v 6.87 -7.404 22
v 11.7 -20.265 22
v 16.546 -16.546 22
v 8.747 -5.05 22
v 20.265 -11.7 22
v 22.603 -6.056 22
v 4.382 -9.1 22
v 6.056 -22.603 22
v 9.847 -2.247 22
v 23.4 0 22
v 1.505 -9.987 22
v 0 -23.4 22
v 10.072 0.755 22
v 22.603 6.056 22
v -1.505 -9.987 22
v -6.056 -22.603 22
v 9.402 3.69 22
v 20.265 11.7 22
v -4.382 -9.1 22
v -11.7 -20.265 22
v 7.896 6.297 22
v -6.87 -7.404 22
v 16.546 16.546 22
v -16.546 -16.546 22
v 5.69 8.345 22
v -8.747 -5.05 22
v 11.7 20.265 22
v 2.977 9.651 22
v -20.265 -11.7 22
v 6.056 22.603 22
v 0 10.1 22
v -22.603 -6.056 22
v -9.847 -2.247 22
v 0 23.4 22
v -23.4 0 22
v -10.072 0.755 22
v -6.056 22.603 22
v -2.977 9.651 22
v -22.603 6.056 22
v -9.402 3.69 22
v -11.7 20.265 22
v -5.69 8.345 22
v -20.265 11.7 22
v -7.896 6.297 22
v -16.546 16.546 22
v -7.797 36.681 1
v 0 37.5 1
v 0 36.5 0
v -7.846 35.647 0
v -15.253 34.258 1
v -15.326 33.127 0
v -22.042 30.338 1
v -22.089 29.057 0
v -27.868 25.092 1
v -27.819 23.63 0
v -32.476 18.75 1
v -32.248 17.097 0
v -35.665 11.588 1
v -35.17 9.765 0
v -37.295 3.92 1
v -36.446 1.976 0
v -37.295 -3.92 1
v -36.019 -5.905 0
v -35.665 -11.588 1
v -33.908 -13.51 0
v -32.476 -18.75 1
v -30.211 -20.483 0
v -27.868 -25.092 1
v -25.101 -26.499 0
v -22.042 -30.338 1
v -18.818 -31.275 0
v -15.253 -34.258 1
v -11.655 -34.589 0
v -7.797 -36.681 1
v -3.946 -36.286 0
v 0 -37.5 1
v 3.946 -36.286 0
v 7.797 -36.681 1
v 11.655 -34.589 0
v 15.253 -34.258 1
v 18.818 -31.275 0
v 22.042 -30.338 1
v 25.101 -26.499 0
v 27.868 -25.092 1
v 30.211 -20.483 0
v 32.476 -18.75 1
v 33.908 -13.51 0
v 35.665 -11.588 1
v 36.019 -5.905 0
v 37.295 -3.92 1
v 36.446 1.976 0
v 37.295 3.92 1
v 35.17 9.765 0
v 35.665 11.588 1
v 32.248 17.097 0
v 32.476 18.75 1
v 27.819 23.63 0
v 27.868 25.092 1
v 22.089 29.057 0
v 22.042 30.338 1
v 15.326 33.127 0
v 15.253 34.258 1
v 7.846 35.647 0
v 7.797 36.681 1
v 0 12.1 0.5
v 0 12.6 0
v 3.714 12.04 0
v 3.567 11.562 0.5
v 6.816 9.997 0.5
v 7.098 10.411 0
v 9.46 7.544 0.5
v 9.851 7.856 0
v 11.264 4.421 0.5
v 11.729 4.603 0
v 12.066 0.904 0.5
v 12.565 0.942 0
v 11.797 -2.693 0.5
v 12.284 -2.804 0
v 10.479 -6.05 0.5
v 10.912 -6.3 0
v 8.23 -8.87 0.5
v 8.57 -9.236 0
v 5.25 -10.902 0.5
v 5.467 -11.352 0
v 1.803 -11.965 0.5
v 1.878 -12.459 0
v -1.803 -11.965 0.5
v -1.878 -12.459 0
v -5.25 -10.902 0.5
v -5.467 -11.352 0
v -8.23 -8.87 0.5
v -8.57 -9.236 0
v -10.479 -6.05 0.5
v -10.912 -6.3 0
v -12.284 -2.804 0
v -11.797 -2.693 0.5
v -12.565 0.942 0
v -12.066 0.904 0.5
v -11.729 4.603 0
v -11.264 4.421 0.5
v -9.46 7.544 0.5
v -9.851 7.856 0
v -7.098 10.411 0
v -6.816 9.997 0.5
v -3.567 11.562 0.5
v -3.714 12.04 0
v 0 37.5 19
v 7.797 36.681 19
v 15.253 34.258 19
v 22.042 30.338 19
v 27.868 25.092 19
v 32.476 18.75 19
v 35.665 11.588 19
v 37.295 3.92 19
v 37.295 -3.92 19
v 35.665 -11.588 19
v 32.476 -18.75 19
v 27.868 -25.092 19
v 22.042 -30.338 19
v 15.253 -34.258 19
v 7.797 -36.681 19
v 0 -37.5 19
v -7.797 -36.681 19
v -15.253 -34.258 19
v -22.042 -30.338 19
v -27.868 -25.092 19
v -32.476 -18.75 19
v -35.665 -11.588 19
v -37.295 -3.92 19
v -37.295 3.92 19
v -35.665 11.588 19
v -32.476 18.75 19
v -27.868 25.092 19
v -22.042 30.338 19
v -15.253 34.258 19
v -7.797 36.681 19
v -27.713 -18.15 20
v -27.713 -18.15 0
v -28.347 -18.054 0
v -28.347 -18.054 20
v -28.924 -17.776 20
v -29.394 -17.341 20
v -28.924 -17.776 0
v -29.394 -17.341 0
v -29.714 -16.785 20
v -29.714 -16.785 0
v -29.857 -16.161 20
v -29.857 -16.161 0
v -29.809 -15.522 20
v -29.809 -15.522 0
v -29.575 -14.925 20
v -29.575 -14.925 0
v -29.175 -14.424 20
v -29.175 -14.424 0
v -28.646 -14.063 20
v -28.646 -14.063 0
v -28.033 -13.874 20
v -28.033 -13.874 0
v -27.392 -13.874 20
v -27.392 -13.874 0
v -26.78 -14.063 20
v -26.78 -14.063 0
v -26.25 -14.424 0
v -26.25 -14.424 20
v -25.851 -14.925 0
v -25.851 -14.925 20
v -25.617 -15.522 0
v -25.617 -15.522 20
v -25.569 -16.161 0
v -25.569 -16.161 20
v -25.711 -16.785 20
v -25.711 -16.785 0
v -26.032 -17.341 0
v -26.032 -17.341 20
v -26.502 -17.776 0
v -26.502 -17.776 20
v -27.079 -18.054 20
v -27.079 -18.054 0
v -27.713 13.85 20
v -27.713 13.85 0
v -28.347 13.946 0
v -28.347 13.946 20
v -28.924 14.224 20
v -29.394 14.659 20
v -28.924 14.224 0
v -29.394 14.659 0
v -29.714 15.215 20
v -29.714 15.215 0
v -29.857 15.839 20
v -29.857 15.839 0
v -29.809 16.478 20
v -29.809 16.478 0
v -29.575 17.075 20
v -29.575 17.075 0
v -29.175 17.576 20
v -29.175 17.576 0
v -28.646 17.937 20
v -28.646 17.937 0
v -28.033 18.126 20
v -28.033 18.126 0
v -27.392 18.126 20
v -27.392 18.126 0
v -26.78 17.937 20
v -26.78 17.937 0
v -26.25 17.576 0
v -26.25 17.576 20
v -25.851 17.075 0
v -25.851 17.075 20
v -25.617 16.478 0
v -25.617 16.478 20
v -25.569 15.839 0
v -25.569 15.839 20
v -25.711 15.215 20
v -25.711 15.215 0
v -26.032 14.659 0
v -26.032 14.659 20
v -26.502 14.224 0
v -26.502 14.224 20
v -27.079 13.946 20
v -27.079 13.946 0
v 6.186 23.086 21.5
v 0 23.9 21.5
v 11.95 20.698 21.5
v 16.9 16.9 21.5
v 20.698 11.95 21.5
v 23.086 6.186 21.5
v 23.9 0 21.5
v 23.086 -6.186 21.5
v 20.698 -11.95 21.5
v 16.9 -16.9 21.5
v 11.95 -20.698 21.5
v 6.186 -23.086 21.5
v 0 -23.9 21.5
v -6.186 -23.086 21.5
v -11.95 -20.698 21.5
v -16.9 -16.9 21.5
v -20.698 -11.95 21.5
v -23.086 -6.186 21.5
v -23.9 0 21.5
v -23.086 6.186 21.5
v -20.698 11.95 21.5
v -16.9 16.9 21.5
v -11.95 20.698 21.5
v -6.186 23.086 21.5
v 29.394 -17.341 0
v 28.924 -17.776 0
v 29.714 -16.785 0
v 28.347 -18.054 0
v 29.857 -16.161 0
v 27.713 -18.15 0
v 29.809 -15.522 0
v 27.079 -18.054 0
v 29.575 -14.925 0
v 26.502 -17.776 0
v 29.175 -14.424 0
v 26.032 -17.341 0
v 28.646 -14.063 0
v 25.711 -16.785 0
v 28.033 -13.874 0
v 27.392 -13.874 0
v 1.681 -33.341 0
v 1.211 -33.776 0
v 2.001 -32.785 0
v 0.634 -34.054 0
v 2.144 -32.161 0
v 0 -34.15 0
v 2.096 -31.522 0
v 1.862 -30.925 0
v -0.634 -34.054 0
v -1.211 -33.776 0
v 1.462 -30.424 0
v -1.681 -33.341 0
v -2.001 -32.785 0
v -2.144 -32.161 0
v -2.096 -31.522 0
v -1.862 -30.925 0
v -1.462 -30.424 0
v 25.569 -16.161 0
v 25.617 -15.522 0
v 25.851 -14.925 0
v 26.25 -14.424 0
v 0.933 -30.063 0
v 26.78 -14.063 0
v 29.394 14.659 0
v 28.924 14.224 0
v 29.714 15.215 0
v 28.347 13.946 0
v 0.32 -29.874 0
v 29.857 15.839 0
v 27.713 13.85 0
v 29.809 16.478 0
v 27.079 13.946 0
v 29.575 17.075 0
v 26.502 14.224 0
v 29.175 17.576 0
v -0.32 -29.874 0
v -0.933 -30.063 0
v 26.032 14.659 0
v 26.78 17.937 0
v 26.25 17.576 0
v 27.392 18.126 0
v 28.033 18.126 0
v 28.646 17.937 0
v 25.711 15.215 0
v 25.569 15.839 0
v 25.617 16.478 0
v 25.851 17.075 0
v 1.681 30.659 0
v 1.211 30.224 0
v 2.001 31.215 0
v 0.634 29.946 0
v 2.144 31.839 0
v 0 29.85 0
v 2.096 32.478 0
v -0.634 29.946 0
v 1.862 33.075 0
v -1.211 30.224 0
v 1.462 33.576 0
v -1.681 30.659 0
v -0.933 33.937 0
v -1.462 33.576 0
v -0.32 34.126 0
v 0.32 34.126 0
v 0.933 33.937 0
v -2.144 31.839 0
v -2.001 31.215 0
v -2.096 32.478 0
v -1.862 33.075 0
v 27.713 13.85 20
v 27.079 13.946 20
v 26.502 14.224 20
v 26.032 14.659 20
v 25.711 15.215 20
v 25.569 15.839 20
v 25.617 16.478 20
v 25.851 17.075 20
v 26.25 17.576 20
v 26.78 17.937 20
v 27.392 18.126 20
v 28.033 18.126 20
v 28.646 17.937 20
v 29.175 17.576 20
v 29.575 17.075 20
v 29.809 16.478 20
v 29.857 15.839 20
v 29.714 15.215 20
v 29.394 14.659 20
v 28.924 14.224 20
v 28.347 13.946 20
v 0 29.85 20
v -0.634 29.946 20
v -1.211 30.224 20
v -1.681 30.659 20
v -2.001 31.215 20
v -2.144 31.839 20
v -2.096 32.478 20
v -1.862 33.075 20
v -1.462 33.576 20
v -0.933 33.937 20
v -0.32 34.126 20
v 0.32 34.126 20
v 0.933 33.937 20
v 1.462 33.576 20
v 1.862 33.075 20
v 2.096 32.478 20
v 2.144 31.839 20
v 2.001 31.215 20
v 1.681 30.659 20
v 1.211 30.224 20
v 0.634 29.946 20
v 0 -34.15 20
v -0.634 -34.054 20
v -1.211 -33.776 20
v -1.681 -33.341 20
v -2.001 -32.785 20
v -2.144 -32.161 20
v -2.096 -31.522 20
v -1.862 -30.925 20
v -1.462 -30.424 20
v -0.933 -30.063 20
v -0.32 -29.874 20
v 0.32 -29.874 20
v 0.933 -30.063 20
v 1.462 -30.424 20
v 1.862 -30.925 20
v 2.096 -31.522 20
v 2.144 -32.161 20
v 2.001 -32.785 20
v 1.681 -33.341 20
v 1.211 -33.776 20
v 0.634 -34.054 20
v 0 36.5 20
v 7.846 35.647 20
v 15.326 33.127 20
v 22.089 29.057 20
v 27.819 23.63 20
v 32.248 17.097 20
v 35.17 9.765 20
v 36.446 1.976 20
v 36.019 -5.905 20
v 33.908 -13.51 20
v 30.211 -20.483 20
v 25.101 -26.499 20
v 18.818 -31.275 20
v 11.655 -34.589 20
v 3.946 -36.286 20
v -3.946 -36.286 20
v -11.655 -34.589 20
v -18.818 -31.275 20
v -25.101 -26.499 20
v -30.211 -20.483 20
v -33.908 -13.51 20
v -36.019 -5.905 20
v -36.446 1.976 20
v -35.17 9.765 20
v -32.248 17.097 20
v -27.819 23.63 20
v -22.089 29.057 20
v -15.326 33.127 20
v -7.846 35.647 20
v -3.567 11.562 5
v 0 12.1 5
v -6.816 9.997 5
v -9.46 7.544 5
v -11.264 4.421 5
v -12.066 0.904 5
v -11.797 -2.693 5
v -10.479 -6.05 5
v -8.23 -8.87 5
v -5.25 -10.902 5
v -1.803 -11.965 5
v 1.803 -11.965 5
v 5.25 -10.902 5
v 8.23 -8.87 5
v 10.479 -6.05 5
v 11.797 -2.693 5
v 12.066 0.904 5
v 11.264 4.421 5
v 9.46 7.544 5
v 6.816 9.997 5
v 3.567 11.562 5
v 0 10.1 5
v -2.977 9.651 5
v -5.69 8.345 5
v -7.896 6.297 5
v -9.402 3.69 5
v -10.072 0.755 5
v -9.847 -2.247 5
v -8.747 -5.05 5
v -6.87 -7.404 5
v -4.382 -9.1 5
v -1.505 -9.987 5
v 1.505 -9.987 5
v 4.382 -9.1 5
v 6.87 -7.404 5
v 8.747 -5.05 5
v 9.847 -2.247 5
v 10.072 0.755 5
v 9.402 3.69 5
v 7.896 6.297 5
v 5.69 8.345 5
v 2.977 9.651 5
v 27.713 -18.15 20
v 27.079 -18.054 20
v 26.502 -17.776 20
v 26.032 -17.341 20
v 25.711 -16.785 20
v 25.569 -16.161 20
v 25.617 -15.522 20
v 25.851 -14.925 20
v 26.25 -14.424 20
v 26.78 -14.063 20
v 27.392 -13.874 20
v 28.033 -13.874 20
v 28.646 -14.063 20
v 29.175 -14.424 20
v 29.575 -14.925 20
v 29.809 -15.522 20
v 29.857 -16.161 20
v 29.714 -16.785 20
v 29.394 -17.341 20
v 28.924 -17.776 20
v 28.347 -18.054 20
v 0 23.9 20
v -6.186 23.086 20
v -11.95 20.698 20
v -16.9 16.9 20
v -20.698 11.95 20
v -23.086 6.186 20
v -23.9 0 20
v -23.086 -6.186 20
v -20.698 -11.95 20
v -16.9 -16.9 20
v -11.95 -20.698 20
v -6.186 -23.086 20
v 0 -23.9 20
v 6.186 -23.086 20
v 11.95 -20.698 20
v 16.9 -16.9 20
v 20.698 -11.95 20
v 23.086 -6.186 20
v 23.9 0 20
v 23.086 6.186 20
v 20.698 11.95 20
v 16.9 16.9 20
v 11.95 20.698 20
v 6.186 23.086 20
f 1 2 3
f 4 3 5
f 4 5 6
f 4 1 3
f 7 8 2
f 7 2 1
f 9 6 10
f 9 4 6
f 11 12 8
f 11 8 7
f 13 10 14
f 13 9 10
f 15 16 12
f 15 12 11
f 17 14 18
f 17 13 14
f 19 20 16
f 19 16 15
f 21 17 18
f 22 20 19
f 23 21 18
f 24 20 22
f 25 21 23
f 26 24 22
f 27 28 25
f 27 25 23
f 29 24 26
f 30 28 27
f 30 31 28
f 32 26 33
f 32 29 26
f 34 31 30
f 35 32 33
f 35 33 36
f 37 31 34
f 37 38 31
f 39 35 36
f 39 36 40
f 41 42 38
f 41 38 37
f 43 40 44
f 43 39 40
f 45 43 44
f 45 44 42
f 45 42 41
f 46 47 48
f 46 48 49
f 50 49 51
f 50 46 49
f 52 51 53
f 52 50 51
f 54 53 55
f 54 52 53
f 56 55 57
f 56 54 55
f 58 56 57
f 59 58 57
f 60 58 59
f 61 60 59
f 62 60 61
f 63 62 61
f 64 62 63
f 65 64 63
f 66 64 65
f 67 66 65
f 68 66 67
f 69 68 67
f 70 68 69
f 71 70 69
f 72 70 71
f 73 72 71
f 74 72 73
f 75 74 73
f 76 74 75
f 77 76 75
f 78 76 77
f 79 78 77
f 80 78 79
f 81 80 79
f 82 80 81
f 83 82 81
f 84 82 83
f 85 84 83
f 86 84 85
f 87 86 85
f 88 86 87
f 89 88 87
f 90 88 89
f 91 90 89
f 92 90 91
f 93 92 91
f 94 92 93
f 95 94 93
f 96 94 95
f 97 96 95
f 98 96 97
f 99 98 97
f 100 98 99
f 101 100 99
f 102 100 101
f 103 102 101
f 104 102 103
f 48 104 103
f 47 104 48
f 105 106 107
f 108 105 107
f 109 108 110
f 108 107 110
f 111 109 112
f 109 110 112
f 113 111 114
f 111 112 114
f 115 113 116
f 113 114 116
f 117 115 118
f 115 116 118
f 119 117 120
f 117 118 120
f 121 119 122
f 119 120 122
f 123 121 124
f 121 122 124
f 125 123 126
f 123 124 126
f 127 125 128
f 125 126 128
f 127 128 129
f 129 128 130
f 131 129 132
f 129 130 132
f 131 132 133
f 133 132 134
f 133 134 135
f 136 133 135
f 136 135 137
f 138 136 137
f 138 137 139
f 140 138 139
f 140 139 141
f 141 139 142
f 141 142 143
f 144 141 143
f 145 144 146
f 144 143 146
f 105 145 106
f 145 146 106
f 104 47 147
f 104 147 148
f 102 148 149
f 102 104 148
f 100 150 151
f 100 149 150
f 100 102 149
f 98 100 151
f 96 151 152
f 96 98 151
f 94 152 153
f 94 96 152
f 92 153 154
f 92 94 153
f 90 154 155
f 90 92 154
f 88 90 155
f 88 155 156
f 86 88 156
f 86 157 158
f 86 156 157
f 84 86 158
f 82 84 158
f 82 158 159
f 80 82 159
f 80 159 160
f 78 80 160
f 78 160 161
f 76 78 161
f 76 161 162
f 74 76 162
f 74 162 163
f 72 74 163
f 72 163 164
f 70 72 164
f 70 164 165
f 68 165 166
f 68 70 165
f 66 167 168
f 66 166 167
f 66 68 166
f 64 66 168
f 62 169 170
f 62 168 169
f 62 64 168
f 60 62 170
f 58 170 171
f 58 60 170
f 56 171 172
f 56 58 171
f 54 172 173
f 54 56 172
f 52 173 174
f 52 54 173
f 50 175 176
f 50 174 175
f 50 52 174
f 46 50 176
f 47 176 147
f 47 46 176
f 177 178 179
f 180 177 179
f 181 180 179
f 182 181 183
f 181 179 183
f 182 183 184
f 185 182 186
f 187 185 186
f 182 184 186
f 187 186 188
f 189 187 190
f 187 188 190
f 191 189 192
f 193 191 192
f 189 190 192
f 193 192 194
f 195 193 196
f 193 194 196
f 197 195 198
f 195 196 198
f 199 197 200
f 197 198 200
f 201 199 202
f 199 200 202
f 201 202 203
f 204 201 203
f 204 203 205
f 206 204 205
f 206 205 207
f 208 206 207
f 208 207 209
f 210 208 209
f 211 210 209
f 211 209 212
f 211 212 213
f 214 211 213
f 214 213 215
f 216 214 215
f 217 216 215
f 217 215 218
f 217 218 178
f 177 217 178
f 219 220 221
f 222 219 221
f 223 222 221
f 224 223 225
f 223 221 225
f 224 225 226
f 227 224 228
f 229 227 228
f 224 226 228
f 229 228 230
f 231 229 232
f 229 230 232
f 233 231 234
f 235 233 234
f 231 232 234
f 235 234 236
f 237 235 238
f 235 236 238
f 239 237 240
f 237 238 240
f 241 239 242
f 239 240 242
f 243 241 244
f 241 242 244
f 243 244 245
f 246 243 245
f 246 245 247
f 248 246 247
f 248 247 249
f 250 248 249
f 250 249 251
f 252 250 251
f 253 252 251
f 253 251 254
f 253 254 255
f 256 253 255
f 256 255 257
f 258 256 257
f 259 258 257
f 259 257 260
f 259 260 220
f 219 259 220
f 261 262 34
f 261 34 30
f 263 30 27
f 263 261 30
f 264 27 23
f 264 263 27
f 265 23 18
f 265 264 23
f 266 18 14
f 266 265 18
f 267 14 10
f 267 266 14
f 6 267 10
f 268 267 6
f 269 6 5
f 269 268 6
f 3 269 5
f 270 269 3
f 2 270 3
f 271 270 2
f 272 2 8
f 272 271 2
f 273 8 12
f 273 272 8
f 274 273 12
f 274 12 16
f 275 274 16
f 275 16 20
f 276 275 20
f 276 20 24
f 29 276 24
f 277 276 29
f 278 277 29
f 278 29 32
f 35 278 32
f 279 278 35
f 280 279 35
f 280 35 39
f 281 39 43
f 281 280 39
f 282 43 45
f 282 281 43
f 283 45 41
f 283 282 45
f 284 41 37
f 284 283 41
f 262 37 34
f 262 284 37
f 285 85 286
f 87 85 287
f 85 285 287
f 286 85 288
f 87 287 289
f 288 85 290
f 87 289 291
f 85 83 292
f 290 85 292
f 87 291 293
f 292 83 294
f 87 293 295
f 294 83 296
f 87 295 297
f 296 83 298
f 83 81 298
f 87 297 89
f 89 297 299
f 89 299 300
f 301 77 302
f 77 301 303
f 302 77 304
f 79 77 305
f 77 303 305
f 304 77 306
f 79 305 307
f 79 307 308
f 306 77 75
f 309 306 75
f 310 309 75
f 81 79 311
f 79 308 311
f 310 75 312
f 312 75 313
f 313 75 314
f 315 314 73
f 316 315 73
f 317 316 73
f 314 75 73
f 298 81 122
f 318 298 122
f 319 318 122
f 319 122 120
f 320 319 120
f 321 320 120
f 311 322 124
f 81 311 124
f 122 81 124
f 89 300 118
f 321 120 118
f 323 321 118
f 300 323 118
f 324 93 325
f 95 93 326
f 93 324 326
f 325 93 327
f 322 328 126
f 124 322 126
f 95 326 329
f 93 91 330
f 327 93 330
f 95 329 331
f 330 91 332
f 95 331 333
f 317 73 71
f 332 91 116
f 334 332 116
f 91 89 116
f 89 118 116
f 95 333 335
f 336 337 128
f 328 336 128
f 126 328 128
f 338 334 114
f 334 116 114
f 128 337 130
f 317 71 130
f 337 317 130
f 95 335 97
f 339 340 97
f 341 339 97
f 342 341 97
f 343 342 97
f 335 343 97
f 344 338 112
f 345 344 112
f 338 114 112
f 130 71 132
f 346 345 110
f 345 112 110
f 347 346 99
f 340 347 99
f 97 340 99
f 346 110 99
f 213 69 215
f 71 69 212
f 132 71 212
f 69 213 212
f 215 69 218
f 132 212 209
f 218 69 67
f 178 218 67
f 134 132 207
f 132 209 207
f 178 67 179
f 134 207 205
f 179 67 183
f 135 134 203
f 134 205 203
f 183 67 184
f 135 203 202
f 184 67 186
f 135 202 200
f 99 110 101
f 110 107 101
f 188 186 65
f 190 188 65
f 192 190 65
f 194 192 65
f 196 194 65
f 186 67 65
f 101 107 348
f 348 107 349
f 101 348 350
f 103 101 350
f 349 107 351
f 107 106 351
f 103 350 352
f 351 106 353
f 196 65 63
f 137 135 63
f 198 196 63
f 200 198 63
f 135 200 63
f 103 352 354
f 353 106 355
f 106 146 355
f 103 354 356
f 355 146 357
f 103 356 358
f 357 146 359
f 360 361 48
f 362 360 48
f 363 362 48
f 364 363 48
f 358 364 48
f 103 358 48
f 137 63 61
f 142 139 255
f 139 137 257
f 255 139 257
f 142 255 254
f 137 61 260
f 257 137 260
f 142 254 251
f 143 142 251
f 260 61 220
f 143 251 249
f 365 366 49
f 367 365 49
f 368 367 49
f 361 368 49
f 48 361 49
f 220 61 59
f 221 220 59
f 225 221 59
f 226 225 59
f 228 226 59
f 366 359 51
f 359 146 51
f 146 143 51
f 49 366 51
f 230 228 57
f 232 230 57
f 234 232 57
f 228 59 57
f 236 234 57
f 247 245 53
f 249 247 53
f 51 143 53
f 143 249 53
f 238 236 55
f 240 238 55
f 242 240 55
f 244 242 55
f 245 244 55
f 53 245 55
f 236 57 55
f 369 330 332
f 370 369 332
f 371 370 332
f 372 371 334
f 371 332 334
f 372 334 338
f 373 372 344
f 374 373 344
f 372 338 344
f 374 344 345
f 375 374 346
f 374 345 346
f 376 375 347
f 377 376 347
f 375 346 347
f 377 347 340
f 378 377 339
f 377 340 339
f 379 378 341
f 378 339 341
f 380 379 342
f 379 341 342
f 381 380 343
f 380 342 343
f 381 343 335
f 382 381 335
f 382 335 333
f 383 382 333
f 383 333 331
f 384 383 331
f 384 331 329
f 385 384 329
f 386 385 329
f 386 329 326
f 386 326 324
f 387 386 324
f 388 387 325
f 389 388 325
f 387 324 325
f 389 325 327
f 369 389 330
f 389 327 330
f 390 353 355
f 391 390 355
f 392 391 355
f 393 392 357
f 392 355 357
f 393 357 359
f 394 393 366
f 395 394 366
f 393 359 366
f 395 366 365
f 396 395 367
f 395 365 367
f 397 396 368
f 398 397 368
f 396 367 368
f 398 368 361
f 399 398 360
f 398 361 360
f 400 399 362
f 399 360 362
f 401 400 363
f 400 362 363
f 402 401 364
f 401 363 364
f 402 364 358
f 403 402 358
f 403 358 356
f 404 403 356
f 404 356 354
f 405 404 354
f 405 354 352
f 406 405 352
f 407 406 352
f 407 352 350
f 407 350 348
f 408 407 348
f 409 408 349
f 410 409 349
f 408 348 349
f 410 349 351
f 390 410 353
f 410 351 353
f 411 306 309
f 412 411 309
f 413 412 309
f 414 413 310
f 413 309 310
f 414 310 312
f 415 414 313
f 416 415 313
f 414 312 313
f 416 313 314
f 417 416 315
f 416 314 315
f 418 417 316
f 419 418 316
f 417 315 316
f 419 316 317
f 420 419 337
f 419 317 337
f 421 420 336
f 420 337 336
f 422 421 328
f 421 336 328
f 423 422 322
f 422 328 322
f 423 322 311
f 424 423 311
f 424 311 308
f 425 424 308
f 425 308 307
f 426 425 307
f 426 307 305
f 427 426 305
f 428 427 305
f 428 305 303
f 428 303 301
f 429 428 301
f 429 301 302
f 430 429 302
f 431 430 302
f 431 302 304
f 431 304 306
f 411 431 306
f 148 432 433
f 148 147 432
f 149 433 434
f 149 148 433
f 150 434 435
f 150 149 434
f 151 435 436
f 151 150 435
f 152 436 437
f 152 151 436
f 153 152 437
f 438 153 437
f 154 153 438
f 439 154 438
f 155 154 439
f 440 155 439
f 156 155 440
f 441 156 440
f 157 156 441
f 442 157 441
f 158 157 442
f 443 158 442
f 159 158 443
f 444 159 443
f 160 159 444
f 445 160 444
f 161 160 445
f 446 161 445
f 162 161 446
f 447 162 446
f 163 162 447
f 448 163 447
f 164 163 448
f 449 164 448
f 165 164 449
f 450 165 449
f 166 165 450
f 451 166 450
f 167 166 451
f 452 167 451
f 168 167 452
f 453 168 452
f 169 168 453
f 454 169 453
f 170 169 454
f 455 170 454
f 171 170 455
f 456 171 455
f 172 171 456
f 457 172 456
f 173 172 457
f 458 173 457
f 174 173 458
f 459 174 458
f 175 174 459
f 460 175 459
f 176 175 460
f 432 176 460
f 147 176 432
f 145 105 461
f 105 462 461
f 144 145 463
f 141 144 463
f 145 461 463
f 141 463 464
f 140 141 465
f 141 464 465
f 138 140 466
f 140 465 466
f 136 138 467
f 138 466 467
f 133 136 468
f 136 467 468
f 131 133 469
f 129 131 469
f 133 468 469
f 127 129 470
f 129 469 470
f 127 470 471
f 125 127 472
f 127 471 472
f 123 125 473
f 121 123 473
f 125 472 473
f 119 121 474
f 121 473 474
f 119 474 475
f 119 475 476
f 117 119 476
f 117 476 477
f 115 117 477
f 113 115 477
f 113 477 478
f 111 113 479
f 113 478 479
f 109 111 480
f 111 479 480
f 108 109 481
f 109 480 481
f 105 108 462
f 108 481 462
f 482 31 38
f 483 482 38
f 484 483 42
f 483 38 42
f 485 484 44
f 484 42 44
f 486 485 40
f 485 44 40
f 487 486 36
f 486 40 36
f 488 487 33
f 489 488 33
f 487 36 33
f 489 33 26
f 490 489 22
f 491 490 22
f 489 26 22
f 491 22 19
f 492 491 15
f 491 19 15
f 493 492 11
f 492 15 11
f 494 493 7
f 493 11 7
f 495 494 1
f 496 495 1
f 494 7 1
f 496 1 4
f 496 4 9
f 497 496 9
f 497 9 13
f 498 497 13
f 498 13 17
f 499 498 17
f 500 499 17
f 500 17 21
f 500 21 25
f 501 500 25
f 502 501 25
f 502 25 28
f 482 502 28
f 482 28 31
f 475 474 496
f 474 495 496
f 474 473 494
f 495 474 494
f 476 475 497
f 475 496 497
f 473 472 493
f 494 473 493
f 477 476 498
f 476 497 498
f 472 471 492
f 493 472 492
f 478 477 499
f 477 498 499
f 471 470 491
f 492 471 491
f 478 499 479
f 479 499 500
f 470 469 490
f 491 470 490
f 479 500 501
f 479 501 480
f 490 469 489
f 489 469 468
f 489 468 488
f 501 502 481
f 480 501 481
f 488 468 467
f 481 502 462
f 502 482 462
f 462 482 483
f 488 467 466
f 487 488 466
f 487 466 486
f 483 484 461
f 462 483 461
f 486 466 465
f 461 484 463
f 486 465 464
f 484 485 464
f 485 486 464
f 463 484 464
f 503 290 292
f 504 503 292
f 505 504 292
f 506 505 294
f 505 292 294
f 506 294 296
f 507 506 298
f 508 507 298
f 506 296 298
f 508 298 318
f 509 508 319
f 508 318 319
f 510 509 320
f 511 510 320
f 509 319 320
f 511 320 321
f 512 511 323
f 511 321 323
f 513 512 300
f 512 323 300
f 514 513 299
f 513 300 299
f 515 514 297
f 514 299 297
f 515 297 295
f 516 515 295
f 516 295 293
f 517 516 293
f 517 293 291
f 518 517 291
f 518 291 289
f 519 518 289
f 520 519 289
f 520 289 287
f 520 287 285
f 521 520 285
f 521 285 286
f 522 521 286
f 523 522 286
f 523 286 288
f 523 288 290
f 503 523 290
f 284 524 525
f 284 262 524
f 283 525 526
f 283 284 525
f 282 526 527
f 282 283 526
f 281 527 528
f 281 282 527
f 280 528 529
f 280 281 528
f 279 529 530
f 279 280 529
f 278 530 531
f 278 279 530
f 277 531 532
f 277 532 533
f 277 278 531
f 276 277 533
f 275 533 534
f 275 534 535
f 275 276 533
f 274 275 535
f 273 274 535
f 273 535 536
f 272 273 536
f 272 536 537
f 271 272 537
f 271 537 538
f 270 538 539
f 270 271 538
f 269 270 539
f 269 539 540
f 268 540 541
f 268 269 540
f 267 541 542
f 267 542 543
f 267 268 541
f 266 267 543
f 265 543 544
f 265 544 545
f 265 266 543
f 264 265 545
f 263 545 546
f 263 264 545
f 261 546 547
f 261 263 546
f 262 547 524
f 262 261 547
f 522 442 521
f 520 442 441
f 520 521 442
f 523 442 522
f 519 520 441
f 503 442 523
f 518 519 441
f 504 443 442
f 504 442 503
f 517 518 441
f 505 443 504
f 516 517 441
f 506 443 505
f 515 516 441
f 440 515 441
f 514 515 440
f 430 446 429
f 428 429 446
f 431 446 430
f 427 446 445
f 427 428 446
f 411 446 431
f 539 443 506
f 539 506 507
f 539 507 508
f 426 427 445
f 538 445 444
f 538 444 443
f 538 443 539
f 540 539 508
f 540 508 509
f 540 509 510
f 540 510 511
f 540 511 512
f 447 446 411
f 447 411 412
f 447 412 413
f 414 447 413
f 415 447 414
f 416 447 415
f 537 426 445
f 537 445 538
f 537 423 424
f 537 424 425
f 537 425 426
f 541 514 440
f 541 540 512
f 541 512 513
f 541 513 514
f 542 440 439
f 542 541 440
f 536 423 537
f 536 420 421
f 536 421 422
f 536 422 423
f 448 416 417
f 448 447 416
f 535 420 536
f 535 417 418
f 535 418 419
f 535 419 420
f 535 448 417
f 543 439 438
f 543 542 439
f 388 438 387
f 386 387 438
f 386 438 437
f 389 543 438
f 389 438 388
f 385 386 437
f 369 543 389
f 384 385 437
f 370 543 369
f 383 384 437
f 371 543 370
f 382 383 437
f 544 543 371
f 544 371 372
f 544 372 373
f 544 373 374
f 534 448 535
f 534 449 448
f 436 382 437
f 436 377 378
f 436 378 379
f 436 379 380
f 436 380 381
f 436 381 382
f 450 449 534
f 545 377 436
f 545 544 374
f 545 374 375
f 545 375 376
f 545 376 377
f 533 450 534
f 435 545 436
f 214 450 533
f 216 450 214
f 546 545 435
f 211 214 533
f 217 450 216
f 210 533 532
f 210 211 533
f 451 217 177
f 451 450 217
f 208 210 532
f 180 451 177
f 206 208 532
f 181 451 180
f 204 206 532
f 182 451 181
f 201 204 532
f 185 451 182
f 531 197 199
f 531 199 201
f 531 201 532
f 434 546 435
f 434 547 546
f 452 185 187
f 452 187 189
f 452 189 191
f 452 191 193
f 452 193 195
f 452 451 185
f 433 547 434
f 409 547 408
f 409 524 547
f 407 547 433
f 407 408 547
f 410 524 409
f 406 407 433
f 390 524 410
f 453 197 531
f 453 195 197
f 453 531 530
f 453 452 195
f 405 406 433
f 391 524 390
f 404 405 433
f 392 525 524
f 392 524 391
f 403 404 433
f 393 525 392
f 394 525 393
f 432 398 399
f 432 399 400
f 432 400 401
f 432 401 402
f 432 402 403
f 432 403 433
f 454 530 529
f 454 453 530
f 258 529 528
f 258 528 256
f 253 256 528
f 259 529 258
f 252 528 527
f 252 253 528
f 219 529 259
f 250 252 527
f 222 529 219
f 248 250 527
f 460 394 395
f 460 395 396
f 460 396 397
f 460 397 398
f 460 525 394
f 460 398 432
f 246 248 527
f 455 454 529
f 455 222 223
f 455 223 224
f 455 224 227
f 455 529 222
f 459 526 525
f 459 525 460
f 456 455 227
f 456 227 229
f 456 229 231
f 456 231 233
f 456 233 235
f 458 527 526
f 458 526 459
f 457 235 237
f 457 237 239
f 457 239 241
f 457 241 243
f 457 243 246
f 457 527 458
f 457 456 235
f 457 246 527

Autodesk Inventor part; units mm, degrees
ref_plane "YZ Plane" through (0, 0, 0) normal (1, 0, 0) x (0, 1, 0)
ref_plane "XZ Plane" through (0, 0, 0) normal (0, 1, 0) x (-1, 0, 0)
ref_plane "XY Plane" through (0, 0, 0) normal (0, 0, 1) x (1, 0, 0)
sketch "スケッチ1" plane through (0, 0, 0) normal (1, 0, 0) x (0, 1, 0)
  line L0 (12.1, 0) -> (12.1, 5)
  line L1 (12.1, 5) -> (10.1, 5)
  line L2 (10.1, 5) -> (10.1, 22)
  line L3 (23.9, 20) -> (37.5, 20)
  line L4 (37.5, 20) -> (37.5, 0)
  line L5 (37.5, 0) -> (12.1, 0)
  line L6 (0, -4.4) -> (0, 26.4) projected
  line L7 (23.9, 20) -> (23.9, 22)
  line L8 (23.9, 22) -> (10.1, 22)
  point P0 (0, 0)
  dimension "d0" = 12.1
  dimension "d1" = 37.5
  dimension "d2" = 2
  dimension "d3" = 5
  dimension "d5" = 20
  dimension "d28" = 2
  dimension "d29" = 23.9
revolve "回転1" add sketch "スケッチ1" angle 360 about axis through (0, 0, -10) along (0, 0, 1)
chamfer "面取り1" distance 0.5 angle 45 1 edges at (0, -12.1, 0)
sketch "スケッチ2" plane through (0, 0, 20) normal (0, 0, 1) x (1, 0, 0)
  circle A0 centre (0, 0) radius 32
  point P0 (0, 32)
  point P1 (-27.7128, 16)
  point P2 (-27.7128, -16)
  point P3 (0, -32)
  point P4 (27.7128, -16)
  point P5 (27.7128, 16)
  dimension "d10" = 64
  dimension "d13" = 360
hole "穴1" at (0, 32, 20) at (-27.7128, 16, 20) at (-27.7128, -16, 20) at (0, -32, 20) at (27.7128, -16, 20) at (27.7128, 16, 20) direction (0, 0, -1) diameter 4.3 end through all clearance for "Flat Head Machine Screw" size "M4" standard "Ansi Metric M Profile"
chamfer "面取り2" distance 1 angle 45 2 edges at (0, -37.5, 0) (0, -37.5, 20)
chamfer "面取り3" distance 0.5 angle 45 1 edges at (0, -23.9, 22)
properties part number "unit-base2" material "ABS プラスチック"
